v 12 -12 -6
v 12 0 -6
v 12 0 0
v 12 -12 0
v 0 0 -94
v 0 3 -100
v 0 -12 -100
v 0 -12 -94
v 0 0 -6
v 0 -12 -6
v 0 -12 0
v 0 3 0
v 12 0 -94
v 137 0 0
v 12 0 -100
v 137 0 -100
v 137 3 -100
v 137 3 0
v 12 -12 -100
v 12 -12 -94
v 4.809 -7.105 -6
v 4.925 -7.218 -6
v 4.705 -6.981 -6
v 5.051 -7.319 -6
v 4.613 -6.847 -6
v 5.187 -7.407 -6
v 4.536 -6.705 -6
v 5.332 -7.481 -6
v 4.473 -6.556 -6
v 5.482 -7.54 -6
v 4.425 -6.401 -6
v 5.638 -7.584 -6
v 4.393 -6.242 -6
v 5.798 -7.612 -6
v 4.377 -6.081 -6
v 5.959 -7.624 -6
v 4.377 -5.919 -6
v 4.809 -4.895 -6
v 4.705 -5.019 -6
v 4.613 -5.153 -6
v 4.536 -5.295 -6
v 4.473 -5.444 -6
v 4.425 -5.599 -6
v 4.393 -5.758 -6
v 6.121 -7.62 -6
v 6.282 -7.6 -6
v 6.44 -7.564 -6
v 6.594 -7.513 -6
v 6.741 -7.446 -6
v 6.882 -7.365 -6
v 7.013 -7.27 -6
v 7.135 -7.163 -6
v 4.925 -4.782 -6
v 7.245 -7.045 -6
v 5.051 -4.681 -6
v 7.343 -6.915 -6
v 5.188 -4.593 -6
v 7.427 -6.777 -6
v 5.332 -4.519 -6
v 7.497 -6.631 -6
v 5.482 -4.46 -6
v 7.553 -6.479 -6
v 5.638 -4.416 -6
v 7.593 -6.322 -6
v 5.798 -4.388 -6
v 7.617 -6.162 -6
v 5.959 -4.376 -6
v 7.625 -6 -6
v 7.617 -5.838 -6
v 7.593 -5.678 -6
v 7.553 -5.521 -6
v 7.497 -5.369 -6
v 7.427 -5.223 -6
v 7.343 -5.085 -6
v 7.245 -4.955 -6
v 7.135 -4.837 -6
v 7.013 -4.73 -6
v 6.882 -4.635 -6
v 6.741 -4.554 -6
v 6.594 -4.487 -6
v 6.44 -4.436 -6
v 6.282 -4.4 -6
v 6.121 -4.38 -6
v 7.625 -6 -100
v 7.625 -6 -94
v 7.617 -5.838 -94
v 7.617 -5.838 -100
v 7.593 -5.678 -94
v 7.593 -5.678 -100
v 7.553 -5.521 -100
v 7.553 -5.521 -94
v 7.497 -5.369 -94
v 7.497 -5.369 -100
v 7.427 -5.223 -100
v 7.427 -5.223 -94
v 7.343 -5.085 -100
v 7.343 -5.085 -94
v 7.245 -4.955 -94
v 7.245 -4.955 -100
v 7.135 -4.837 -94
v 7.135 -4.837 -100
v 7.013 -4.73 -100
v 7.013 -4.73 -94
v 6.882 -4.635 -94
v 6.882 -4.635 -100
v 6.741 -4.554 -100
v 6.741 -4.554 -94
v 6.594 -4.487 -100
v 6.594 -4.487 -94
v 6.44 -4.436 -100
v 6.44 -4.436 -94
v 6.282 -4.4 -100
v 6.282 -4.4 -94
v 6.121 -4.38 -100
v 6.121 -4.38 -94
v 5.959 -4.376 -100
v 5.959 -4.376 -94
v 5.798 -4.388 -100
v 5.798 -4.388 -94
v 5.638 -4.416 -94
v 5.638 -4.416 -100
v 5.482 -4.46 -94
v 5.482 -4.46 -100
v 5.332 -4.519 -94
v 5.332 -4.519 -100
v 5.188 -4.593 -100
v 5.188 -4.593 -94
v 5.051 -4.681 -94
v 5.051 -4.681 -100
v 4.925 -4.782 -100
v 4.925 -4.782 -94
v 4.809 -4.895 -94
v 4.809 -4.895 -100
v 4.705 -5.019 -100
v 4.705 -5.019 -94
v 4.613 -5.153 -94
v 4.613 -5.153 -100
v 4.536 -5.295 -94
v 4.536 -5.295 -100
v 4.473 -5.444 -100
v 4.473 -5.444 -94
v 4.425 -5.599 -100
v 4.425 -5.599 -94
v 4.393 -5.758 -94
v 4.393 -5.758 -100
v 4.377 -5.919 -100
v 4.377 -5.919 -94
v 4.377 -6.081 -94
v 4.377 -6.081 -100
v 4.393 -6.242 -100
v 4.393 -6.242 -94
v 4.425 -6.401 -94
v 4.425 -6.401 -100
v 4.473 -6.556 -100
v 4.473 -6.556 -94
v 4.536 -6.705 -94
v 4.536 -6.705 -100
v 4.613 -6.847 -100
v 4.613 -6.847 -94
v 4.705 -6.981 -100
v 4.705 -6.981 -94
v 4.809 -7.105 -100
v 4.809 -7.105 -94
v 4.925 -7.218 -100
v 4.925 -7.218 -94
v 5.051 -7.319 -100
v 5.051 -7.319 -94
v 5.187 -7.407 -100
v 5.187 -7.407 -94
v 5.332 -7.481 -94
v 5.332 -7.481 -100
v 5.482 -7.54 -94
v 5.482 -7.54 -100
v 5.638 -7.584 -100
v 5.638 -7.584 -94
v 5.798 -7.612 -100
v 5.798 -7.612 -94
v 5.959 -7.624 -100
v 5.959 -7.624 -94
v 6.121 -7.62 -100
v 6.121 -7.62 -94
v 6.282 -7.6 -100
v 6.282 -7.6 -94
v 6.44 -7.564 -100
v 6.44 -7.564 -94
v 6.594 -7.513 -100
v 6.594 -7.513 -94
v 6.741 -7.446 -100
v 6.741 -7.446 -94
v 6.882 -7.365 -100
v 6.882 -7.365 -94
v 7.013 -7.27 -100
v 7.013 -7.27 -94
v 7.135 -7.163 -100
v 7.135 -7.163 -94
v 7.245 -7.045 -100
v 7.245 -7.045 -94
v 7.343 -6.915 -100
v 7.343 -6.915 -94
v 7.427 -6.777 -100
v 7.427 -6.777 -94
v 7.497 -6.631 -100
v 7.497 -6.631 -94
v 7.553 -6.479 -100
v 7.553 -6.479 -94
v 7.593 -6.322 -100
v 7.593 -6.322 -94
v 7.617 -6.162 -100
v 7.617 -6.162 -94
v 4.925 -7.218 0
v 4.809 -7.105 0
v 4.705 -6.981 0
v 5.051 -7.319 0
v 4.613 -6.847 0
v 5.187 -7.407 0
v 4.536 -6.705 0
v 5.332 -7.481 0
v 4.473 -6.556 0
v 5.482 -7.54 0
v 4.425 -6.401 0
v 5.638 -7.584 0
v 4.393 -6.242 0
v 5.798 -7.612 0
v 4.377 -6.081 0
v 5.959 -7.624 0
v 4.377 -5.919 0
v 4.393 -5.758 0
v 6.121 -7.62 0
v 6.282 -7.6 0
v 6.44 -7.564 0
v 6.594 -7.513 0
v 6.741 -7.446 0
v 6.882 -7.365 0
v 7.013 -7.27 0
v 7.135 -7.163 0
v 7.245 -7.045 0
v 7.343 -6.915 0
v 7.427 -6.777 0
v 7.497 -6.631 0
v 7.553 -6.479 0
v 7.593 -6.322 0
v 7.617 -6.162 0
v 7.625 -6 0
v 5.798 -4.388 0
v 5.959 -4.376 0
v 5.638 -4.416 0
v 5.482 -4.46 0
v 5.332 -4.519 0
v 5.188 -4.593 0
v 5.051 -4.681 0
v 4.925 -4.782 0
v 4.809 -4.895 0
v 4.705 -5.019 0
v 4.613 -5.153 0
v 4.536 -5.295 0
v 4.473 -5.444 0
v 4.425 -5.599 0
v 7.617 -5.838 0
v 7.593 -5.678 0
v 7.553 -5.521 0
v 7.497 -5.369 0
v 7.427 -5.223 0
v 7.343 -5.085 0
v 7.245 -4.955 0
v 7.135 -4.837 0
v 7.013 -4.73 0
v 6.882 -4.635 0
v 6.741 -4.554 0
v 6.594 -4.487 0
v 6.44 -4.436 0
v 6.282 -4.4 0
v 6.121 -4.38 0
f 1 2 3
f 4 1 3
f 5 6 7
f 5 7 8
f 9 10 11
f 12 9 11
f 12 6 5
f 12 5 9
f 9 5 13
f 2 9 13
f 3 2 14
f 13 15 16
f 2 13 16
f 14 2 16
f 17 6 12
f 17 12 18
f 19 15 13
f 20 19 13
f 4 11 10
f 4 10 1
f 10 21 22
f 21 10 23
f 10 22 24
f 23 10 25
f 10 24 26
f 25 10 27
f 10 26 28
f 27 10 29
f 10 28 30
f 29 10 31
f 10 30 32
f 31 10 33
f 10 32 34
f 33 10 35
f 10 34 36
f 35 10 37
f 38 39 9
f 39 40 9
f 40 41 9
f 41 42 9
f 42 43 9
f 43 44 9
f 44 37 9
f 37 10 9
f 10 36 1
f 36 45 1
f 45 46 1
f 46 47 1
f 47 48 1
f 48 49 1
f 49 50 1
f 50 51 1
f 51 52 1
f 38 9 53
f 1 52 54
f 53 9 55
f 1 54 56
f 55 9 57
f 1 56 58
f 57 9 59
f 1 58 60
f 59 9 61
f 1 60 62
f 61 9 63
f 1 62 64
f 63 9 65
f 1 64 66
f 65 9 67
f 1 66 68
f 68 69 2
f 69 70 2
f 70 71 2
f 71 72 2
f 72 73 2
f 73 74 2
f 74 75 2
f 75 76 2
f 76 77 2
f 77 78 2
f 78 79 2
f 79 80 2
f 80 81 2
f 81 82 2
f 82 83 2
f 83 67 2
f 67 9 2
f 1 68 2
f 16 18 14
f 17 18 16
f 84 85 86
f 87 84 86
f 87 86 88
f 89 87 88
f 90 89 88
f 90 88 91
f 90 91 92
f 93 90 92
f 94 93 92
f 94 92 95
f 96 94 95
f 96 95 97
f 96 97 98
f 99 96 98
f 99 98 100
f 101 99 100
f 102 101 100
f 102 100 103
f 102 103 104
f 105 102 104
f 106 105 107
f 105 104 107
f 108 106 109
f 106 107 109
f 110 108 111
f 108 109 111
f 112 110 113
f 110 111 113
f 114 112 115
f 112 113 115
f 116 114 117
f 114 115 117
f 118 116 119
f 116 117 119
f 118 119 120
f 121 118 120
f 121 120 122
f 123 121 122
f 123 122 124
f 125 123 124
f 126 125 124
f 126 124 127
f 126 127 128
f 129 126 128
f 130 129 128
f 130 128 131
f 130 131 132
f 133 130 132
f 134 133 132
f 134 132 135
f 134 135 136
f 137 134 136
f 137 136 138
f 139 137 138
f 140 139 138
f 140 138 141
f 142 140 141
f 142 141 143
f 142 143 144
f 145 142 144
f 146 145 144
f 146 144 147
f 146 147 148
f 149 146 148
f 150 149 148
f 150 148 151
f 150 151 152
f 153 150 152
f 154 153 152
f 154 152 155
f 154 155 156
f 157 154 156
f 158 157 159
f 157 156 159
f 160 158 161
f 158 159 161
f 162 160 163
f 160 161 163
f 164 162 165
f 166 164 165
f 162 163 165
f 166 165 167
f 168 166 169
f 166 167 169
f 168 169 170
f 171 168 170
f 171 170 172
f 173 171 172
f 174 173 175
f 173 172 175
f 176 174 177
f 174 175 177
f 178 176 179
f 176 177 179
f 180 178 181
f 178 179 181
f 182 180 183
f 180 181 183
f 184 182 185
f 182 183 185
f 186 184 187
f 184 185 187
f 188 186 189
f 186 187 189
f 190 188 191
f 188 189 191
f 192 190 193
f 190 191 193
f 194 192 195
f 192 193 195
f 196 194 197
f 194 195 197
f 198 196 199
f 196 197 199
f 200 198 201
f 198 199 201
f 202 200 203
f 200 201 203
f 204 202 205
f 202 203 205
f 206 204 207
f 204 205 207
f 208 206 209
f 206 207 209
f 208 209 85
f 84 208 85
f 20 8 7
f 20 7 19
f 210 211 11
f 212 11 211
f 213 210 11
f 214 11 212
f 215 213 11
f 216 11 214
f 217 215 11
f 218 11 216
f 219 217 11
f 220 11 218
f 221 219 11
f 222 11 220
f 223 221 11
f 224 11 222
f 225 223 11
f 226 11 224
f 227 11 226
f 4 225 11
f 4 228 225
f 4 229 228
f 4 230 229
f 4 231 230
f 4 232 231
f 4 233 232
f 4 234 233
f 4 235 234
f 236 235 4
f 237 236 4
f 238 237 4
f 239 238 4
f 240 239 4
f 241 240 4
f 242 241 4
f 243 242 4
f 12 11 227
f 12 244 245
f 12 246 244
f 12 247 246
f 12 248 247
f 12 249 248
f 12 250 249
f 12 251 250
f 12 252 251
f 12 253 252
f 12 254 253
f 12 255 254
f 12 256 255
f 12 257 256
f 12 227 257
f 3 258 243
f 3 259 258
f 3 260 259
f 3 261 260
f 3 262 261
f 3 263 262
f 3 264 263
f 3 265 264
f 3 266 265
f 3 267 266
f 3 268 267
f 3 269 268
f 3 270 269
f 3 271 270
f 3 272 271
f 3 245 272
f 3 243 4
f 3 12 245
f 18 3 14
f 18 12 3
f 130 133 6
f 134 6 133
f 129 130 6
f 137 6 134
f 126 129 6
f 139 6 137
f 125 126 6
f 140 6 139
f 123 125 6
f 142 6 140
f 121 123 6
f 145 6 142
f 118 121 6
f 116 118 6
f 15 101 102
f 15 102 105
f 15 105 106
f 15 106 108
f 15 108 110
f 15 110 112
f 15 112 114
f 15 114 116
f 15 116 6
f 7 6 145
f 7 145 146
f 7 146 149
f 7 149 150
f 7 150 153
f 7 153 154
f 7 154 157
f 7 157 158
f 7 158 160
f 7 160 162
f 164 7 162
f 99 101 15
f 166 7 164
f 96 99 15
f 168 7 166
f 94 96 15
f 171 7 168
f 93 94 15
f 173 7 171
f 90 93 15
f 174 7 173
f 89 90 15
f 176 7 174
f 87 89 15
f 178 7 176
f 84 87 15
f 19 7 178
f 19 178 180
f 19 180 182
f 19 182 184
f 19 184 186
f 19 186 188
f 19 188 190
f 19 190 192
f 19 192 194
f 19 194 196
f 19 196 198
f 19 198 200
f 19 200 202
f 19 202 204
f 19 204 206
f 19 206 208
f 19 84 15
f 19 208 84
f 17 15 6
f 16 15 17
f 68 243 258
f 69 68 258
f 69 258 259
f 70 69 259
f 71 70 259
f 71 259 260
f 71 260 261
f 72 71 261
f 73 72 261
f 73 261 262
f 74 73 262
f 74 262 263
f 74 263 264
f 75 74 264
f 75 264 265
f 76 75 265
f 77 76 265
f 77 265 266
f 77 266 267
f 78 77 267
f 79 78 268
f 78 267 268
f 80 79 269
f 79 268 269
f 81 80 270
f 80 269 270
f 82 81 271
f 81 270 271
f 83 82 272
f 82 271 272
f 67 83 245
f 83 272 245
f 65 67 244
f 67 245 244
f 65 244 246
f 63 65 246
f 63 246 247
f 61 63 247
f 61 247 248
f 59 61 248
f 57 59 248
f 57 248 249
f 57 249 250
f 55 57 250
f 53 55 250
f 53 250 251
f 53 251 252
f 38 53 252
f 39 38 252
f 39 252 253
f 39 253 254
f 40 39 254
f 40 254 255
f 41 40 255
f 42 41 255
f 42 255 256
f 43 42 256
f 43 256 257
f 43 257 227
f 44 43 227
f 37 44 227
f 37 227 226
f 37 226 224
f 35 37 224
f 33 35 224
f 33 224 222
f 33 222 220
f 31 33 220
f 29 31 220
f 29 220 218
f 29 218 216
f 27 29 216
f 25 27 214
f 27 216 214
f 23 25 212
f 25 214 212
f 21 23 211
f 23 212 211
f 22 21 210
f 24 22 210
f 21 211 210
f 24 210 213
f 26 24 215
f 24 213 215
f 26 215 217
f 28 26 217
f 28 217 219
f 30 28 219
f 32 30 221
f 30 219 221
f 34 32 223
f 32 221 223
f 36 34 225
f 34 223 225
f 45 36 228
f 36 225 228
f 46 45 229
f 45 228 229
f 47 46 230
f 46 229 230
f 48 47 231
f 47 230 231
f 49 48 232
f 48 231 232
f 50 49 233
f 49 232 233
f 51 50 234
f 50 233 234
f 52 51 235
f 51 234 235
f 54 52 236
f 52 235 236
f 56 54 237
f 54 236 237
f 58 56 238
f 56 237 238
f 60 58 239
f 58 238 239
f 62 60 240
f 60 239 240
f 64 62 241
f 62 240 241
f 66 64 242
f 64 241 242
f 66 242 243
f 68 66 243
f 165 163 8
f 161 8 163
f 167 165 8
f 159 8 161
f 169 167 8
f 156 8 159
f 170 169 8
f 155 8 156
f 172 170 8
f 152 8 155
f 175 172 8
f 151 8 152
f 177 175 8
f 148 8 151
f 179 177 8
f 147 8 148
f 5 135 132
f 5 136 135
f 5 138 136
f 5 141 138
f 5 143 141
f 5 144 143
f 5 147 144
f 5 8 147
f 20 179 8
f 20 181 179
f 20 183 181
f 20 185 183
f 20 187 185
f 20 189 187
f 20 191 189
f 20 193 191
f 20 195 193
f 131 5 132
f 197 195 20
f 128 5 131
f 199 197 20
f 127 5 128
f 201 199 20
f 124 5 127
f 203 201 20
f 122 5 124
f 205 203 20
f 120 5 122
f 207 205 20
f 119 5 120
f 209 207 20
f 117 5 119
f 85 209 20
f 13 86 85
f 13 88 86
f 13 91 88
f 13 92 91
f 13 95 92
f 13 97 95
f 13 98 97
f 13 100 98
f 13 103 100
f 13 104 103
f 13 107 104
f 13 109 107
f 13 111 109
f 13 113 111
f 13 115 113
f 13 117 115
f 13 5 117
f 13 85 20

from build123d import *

# Parameters (mm, degrees)
SKETCH1_W           = 150
SKETCH1_H           = 100
BOSS_EXTRUDE1_DEPTH = 3
SKETCH2_W           = 12
SKETCH2_H           = 6
BOSS_EXTRUDE2_DEPTH = 12
SKETCH4_R           = 1.625
CUT_EXTRUDE1_DEPTH  = 181.676506497
SKETCH5_W           = 13
SKETCH5_H           = 100
CUT_EXTRUDE2_DEPTH  = 181.900525151


with BuildPart() as part:
    # Sketch1 → Boss-Extrude1 (new body)
    with BuildSketch(Plane(origin=(0, 0, 0), x_dir=(1, 0, 0), z_dir=(0, 1, 0))):
        with Locations((75, 50)):
            Rectangle(SKETCH1_W, SKETCH1_H)
    extrude(amount=BOSS_EXTRUDE1_DEPTH)

    # Sketch2 → Boss-Extrude2 (add)
    with BuildSketch(Plane.XZ):
        with Locations((6, -3)):
            Rectangle(SKETCH2_W, SKETCH2_H)
        with Locations((144, -3)):
            Rectangle(SKETCH2_W, SKETCH2_H)
        with Locations((144, -97)):
            Rectangle(SKETCH2_W, SKETCH2_H)
        with Locations((6, -97)):
            Rectangle(SKETCH2_W, SKETCH2_H)
    extrude(amount=BOSS_EXTRUDE2_DEPTH)

    # Sketch4 → Cut-Extrude1 (cut, through all)
    with BuildSketch(Plane.XY):
        with Locations((6, -6)):
            Circle(SKETCH4_R)
        with Locations(Location((144, -6, 0), (0, 0, 180))):
            Circle(SKETCH4_R)
    extrude(amount=-CUT_EXTRUDE1_DEPTH, mode=Mode.SUBTRACT)

    # Sketch5 → Cut-Extrude2 (cut, through all)
    with BuildSketch(Plane(origin=(0, 3, 0), x_dir=(1, 0, 0), z_dir=(0, 1, 0))):
        with Locations((143.5, 50)):
            Rectangle(SKETCH5_W, SKETCH5_H)
    extrude(amount=-CUT_EXTRUDE2_DEPTH, mode=Mode.SUBTRACT)


solid = part.part
